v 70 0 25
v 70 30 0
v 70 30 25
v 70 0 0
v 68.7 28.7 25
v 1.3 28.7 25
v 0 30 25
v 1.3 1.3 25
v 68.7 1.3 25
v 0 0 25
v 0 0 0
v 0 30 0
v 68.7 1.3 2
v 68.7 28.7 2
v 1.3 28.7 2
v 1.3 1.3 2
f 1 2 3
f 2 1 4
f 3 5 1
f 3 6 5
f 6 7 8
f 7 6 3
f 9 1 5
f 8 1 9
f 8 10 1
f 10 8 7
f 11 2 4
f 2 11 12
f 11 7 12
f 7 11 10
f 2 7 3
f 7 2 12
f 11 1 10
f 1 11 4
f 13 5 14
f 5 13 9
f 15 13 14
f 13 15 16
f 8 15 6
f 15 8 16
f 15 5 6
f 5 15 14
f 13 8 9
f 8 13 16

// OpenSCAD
$fn = 32;

// ----------------------------------------------------------------------
// Open box: 1.3 mm walls
// ----------------------------------------------------------------------

// --- parameters (mm) ---
box_l = 70;               // outer length, X
box_w = 30;               // outer width, Y
box_h = 25;               // outer height, Z
wall = 1.3;               // wall thickness
floor = 2;                // floor thickness

difference() {
  cube([box_l, box_w, box_h]);
  translate([wall, wall, floor])
    cube([box_l - 2 * wall, box_w - 2 * wall, box_h]);
}
